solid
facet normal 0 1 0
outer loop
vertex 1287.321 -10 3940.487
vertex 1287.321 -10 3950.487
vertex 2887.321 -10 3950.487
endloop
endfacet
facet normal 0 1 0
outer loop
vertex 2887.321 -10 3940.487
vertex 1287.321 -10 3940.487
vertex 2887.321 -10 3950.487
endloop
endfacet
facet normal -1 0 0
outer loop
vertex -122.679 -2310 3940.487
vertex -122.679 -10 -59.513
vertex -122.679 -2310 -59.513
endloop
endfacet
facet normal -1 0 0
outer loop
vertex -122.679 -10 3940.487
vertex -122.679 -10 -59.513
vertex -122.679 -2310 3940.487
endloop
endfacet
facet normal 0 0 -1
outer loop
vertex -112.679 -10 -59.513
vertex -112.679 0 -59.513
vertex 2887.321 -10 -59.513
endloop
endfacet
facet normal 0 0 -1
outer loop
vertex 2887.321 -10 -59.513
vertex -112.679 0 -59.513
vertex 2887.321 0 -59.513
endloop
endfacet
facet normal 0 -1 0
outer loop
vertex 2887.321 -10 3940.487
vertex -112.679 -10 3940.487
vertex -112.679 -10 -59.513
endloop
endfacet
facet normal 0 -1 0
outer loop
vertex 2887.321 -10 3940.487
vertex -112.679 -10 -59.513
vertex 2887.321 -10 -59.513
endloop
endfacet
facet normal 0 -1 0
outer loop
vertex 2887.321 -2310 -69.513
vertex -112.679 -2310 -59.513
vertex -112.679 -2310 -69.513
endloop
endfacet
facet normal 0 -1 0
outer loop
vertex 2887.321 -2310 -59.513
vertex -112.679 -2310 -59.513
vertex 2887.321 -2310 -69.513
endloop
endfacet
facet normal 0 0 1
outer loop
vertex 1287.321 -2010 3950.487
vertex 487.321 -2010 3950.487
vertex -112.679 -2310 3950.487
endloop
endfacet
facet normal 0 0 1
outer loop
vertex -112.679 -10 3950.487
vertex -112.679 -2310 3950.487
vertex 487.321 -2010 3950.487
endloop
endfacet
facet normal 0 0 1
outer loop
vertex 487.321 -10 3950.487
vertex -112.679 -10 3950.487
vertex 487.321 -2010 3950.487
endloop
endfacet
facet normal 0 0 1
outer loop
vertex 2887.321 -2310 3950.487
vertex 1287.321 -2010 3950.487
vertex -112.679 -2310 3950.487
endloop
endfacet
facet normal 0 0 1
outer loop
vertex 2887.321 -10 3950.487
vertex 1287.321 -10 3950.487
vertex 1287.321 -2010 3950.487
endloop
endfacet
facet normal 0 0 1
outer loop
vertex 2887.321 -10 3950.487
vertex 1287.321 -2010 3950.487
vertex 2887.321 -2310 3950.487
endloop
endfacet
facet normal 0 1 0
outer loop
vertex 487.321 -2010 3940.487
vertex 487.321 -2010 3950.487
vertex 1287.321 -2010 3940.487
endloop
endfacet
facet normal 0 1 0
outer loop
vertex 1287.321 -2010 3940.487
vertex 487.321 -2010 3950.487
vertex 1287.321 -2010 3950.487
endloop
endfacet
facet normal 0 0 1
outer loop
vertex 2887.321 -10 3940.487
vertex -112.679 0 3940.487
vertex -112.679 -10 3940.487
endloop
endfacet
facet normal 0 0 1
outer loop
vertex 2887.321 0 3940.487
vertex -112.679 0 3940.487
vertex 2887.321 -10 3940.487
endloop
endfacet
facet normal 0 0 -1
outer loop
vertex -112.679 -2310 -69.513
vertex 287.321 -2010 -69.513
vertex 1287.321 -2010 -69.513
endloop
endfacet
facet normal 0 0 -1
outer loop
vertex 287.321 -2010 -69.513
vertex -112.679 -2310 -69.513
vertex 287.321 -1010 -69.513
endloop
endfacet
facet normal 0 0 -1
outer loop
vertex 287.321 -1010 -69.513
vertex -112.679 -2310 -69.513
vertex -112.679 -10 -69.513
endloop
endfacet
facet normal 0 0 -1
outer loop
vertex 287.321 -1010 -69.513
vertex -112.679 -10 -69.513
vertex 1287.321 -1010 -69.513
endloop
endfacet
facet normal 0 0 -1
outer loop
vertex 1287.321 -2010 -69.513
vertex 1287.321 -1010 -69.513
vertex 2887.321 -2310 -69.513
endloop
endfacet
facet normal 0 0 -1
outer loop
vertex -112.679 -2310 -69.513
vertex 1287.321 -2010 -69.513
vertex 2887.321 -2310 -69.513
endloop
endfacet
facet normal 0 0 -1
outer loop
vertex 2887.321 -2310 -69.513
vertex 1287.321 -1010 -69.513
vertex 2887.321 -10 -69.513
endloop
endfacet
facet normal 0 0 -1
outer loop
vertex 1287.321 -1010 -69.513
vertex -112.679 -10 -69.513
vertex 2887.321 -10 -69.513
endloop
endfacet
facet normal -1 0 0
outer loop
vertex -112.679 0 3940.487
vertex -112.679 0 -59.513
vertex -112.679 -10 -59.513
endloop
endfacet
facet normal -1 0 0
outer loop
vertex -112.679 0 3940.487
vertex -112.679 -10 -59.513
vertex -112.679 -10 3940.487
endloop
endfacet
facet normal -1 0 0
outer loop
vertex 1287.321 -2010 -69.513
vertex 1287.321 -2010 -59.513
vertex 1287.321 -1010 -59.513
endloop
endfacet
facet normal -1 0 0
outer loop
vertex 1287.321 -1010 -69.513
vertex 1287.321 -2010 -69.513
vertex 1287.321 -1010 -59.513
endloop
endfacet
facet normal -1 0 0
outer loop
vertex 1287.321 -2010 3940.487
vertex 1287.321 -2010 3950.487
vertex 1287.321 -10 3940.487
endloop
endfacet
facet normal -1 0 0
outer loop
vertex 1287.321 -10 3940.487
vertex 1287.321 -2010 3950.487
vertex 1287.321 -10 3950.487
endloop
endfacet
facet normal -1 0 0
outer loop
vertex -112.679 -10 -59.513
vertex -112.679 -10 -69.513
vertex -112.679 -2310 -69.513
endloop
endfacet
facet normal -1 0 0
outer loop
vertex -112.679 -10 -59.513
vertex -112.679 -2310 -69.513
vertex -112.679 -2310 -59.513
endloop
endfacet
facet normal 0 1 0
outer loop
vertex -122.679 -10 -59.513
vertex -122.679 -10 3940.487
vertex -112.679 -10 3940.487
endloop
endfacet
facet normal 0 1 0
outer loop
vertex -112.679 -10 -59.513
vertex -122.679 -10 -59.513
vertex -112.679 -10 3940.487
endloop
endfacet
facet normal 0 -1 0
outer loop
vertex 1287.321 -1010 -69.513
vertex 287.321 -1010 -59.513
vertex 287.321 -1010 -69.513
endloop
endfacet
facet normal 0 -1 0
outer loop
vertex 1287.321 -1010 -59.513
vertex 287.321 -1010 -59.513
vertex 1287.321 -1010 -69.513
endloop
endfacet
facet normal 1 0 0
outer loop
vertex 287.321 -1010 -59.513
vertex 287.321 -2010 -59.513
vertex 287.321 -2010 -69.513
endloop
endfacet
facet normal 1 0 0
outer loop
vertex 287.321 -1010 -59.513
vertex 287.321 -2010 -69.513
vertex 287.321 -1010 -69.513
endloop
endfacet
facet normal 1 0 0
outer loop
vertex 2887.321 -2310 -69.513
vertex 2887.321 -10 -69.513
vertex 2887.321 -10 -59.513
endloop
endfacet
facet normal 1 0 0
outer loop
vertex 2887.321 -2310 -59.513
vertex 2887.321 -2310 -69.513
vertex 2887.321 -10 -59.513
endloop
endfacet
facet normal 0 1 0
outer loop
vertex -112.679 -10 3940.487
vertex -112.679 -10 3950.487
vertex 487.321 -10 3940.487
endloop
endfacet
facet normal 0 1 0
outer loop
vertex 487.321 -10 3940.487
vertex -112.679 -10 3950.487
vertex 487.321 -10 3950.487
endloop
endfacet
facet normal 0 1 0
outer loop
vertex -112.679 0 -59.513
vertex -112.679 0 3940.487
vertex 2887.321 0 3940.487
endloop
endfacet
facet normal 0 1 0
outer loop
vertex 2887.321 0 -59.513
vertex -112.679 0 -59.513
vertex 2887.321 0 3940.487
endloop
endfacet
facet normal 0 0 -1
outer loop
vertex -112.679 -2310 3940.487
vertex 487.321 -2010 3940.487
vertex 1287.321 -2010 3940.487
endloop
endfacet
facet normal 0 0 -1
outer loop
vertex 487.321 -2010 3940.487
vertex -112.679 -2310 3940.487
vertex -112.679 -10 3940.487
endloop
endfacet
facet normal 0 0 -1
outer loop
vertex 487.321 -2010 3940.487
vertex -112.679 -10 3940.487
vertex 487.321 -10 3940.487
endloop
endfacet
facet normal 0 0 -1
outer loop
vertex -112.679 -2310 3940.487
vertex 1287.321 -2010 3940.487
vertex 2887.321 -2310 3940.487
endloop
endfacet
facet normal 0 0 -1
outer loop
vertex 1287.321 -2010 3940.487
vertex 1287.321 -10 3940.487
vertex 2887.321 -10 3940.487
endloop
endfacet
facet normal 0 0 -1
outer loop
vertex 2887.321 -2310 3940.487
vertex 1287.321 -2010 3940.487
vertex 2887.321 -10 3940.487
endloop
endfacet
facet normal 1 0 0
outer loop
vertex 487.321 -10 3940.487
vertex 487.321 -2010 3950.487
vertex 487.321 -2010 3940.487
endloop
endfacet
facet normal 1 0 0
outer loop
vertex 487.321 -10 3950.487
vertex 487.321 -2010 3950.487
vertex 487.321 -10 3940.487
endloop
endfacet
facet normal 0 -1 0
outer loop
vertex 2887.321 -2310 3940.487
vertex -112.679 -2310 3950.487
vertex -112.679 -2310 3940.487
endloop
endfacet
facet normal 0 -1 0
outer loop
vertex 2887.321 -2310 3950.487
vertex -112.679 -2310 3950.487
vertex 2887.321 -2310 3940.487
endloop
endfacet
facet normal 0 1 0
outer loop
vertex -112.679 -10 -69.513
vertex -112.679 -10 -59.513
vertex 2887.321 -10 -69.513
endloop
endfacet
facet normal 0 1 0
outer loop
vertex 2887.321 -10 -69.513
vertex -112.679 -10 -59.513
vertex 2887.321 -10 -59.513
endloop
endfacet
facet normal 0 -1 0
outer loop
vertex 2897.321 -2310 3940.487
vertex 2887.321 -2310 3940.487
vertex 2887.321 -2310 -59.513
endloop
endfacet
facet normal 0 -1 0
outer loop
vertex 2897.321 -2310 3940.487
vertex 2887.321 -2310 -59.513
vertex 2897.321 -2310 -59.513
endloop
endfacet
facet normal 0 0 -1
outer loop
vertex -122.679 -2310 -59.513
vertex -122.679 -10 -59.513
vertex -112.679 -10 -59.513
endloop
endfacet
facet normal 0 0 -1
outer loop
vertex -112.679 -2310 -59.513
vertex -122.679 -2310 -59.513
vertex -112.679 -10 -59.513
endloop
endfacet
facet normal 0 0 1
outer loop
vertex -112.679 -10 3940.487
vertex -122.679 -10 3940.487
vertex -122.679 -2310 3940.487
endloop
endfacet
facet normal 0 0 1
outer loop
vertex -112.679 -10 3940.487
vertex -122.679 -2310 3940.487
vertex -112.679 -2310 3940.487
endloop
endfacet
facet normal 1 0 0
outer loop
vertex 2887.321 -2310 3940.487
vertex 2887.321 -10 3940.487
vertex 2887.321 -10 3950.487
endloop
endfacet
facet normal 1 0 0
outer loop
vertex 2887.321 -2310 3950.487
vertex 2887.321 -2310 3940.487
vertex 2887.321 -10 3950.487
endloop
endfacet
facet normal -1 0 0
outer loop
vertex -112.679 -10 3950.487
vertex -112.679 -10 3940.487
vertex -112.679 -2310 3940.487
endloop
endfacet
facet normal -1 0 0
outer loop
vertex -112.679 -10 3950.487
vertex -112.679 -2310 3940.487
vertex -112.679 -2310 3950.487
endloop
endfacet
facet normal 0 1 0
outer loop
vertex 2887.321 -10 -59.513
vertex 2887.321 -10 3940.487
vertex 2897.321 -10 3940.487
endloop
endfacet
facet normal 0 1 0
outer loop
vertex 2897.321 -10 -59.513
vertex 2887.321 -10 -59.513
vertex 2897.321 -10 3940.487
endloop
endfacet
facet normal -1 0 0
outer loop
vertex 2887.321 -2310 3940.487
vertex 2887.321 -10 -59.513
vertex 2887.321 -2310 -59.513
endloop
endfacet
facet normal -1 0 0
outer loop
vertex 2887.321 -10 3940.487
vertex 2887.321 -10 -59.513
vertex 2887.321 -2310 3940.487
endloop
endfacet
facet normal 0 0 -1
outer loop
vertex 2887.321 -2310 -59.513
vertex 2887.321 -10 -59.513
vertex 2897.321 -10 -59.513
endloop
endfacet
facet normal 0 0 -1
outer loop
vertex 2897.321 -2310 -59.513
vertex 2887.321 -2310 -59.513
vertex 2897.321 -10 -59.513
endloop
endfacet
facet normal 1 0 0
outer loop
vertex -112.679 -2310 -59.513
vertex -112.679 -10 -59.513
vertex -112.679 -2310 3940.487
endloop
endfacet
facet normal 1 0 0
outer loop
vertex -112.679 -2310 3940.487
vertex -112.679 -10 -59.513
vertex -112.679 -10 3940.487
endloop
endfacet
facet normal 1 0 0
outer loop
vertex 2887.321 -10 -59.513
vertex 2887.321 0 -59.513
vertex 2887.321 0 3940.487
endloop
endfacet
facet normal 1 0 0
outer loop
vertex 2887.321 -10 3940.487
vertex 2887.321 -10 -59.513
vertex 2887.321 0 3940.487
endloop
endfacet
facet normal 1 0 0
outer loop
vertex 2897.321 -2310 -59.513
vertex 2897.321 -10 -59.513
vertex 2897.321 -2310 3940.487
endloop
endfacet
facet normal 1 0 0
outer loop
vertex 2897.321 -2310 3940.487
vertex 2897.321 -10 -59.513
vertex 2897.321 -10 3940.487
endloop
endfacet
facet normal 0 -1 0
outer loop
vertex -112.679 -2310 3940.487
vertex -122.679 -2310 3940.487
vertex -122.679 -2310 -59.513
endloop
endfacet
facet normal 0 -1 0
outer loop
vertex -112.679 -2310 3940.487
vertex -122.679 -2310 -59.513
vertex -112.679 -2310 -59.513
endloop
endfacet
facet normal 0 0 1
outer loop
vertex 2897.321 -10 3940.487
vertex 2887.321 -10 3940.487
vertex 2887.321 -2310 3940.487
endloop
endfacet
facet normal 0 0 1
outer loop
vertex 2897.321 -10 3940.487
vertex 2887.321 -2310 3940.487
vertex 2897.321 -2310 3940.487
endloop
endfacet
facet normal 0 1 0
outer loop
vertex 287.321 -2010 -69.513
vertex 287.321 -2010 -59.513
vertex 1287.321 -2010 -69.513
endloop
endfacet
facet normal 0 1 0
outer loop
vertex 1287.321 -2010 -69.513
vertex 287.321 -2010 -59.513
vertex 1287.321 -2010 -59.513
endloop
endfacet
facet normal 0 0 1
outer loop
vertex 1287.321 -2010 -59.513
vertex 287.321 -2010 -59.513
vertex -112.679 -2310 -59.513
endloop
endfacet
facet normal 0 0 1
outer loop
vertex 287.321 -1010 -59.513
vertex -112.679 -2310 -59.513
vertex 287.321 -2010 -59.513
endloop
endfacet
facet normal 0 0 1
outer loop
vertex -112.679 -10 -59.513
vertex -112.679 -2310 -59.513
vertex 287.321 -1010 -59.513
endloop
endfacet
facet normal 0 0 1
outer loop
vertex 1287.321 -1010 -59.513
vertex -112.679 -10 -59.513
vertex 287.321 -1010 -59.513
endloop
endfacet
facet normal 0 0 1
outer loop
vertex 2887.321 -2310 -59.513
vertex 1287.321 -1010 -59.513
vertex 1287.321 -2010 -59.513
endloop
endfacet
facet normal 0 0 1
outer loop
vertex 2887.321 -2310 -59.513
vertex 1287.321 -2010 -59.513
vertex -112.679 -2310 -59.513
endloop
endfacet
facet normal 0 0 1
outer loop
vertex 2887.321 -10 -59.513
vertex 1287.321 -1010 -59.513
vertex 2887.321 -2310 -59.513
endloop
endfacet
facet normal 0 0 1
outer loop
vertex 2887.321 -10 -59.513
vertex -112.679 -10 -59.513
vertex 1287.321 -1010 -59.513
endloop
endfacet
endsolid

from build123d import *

# Parameters (mm, degrees)
F0_W      = 3000
F0_H      = 4000
F1_DEPTH  = 10
F2_W      = 10
F2_H      = 4000
F3_DEPTH  = 2300
F4_W      = 3000
F4_H      = 10
F5_DEPTH  = 2300
F6_W      = 10
F6_H      = 4000
F7_DEPTH  = 2300
F8_W      = 3000
F8_H      = 10
F9_DEPTH  = 2300
F10_W     = 1000
F10_H     = 1000
F11_DEPTH = 10
F12_W     = 800
F12_H     = 2000
F13_DEPTH = 10


with BuildPart() as f1:
    # F0 (on Front) → F1 (new body)
    with BuildSketch(Plane.XZ):
        with Locations((1387.320906, 1940.487385)):
            Rectangle(F0_W, F0_H)
    extrude(amount=F1_DEPTH)


with BuildPart() as f3:
    # F2 (on face) → F3 (new body)
    with BuildSketch(Plane.XZ.offset(10)):
        with Locations((-117.679094, 1940.487385)):
            Rectangle(F2_W, F2_H)
    extrude(amount=F3_DEPTH)


with BuildPart() as f5:
    # F4 (on face) → F5 (new body)
    with BuildSketch(Plane.XZ.offset(10)):
        with Locations((1387.320906, 3945.487385)):
            Rectangle(F4_W, F4_H)
    extrude(amount=F5_DEPTH)

    # F12 (on face) → F13 (cut, through all)
    with BuildSketch(Plane.XY.offset(3950.487385)):
        with Locations((887.320906, -1010)):
            Rectangle(F12_W, F12_H)
    extrude(amount=-F13_DEPTH, mode=Mode.SUBTRACT)


with BuildPart() as f7:
    # F6 (on face) → F7 (new body)
    with BuildSketch(Plane.XZ.offset(10)):
        with Locations((2892.320906, 1940.487385)):
            Rectangle(F6_W, F6_H)
    extrude(amount=F7_DEPTH)


with BuildPart() as f9:
    # F8 (on face) → F9 (new body)
    with BuildSketch(Plane.XZ.offset(10)):
        with Locations((1387.320906, -64.512615)):
            Rectangle(F8_W, F8_H)
    extrude(amount=F9_DEPTH)

    # F10 (on face) → F11 (cut, through all)
    with BuildSketch(Plane.XY.offset(-59.512615)):
        with Locations((787.320906, -1510)):
            Rectangle(F10_W, F10_H)
    extrude(amount=-F11_DEPTH, mode=Mode.SUBTRACT)


solid = Compound([f1.part, f3.part, f5.part, f7.part, f9.part])
